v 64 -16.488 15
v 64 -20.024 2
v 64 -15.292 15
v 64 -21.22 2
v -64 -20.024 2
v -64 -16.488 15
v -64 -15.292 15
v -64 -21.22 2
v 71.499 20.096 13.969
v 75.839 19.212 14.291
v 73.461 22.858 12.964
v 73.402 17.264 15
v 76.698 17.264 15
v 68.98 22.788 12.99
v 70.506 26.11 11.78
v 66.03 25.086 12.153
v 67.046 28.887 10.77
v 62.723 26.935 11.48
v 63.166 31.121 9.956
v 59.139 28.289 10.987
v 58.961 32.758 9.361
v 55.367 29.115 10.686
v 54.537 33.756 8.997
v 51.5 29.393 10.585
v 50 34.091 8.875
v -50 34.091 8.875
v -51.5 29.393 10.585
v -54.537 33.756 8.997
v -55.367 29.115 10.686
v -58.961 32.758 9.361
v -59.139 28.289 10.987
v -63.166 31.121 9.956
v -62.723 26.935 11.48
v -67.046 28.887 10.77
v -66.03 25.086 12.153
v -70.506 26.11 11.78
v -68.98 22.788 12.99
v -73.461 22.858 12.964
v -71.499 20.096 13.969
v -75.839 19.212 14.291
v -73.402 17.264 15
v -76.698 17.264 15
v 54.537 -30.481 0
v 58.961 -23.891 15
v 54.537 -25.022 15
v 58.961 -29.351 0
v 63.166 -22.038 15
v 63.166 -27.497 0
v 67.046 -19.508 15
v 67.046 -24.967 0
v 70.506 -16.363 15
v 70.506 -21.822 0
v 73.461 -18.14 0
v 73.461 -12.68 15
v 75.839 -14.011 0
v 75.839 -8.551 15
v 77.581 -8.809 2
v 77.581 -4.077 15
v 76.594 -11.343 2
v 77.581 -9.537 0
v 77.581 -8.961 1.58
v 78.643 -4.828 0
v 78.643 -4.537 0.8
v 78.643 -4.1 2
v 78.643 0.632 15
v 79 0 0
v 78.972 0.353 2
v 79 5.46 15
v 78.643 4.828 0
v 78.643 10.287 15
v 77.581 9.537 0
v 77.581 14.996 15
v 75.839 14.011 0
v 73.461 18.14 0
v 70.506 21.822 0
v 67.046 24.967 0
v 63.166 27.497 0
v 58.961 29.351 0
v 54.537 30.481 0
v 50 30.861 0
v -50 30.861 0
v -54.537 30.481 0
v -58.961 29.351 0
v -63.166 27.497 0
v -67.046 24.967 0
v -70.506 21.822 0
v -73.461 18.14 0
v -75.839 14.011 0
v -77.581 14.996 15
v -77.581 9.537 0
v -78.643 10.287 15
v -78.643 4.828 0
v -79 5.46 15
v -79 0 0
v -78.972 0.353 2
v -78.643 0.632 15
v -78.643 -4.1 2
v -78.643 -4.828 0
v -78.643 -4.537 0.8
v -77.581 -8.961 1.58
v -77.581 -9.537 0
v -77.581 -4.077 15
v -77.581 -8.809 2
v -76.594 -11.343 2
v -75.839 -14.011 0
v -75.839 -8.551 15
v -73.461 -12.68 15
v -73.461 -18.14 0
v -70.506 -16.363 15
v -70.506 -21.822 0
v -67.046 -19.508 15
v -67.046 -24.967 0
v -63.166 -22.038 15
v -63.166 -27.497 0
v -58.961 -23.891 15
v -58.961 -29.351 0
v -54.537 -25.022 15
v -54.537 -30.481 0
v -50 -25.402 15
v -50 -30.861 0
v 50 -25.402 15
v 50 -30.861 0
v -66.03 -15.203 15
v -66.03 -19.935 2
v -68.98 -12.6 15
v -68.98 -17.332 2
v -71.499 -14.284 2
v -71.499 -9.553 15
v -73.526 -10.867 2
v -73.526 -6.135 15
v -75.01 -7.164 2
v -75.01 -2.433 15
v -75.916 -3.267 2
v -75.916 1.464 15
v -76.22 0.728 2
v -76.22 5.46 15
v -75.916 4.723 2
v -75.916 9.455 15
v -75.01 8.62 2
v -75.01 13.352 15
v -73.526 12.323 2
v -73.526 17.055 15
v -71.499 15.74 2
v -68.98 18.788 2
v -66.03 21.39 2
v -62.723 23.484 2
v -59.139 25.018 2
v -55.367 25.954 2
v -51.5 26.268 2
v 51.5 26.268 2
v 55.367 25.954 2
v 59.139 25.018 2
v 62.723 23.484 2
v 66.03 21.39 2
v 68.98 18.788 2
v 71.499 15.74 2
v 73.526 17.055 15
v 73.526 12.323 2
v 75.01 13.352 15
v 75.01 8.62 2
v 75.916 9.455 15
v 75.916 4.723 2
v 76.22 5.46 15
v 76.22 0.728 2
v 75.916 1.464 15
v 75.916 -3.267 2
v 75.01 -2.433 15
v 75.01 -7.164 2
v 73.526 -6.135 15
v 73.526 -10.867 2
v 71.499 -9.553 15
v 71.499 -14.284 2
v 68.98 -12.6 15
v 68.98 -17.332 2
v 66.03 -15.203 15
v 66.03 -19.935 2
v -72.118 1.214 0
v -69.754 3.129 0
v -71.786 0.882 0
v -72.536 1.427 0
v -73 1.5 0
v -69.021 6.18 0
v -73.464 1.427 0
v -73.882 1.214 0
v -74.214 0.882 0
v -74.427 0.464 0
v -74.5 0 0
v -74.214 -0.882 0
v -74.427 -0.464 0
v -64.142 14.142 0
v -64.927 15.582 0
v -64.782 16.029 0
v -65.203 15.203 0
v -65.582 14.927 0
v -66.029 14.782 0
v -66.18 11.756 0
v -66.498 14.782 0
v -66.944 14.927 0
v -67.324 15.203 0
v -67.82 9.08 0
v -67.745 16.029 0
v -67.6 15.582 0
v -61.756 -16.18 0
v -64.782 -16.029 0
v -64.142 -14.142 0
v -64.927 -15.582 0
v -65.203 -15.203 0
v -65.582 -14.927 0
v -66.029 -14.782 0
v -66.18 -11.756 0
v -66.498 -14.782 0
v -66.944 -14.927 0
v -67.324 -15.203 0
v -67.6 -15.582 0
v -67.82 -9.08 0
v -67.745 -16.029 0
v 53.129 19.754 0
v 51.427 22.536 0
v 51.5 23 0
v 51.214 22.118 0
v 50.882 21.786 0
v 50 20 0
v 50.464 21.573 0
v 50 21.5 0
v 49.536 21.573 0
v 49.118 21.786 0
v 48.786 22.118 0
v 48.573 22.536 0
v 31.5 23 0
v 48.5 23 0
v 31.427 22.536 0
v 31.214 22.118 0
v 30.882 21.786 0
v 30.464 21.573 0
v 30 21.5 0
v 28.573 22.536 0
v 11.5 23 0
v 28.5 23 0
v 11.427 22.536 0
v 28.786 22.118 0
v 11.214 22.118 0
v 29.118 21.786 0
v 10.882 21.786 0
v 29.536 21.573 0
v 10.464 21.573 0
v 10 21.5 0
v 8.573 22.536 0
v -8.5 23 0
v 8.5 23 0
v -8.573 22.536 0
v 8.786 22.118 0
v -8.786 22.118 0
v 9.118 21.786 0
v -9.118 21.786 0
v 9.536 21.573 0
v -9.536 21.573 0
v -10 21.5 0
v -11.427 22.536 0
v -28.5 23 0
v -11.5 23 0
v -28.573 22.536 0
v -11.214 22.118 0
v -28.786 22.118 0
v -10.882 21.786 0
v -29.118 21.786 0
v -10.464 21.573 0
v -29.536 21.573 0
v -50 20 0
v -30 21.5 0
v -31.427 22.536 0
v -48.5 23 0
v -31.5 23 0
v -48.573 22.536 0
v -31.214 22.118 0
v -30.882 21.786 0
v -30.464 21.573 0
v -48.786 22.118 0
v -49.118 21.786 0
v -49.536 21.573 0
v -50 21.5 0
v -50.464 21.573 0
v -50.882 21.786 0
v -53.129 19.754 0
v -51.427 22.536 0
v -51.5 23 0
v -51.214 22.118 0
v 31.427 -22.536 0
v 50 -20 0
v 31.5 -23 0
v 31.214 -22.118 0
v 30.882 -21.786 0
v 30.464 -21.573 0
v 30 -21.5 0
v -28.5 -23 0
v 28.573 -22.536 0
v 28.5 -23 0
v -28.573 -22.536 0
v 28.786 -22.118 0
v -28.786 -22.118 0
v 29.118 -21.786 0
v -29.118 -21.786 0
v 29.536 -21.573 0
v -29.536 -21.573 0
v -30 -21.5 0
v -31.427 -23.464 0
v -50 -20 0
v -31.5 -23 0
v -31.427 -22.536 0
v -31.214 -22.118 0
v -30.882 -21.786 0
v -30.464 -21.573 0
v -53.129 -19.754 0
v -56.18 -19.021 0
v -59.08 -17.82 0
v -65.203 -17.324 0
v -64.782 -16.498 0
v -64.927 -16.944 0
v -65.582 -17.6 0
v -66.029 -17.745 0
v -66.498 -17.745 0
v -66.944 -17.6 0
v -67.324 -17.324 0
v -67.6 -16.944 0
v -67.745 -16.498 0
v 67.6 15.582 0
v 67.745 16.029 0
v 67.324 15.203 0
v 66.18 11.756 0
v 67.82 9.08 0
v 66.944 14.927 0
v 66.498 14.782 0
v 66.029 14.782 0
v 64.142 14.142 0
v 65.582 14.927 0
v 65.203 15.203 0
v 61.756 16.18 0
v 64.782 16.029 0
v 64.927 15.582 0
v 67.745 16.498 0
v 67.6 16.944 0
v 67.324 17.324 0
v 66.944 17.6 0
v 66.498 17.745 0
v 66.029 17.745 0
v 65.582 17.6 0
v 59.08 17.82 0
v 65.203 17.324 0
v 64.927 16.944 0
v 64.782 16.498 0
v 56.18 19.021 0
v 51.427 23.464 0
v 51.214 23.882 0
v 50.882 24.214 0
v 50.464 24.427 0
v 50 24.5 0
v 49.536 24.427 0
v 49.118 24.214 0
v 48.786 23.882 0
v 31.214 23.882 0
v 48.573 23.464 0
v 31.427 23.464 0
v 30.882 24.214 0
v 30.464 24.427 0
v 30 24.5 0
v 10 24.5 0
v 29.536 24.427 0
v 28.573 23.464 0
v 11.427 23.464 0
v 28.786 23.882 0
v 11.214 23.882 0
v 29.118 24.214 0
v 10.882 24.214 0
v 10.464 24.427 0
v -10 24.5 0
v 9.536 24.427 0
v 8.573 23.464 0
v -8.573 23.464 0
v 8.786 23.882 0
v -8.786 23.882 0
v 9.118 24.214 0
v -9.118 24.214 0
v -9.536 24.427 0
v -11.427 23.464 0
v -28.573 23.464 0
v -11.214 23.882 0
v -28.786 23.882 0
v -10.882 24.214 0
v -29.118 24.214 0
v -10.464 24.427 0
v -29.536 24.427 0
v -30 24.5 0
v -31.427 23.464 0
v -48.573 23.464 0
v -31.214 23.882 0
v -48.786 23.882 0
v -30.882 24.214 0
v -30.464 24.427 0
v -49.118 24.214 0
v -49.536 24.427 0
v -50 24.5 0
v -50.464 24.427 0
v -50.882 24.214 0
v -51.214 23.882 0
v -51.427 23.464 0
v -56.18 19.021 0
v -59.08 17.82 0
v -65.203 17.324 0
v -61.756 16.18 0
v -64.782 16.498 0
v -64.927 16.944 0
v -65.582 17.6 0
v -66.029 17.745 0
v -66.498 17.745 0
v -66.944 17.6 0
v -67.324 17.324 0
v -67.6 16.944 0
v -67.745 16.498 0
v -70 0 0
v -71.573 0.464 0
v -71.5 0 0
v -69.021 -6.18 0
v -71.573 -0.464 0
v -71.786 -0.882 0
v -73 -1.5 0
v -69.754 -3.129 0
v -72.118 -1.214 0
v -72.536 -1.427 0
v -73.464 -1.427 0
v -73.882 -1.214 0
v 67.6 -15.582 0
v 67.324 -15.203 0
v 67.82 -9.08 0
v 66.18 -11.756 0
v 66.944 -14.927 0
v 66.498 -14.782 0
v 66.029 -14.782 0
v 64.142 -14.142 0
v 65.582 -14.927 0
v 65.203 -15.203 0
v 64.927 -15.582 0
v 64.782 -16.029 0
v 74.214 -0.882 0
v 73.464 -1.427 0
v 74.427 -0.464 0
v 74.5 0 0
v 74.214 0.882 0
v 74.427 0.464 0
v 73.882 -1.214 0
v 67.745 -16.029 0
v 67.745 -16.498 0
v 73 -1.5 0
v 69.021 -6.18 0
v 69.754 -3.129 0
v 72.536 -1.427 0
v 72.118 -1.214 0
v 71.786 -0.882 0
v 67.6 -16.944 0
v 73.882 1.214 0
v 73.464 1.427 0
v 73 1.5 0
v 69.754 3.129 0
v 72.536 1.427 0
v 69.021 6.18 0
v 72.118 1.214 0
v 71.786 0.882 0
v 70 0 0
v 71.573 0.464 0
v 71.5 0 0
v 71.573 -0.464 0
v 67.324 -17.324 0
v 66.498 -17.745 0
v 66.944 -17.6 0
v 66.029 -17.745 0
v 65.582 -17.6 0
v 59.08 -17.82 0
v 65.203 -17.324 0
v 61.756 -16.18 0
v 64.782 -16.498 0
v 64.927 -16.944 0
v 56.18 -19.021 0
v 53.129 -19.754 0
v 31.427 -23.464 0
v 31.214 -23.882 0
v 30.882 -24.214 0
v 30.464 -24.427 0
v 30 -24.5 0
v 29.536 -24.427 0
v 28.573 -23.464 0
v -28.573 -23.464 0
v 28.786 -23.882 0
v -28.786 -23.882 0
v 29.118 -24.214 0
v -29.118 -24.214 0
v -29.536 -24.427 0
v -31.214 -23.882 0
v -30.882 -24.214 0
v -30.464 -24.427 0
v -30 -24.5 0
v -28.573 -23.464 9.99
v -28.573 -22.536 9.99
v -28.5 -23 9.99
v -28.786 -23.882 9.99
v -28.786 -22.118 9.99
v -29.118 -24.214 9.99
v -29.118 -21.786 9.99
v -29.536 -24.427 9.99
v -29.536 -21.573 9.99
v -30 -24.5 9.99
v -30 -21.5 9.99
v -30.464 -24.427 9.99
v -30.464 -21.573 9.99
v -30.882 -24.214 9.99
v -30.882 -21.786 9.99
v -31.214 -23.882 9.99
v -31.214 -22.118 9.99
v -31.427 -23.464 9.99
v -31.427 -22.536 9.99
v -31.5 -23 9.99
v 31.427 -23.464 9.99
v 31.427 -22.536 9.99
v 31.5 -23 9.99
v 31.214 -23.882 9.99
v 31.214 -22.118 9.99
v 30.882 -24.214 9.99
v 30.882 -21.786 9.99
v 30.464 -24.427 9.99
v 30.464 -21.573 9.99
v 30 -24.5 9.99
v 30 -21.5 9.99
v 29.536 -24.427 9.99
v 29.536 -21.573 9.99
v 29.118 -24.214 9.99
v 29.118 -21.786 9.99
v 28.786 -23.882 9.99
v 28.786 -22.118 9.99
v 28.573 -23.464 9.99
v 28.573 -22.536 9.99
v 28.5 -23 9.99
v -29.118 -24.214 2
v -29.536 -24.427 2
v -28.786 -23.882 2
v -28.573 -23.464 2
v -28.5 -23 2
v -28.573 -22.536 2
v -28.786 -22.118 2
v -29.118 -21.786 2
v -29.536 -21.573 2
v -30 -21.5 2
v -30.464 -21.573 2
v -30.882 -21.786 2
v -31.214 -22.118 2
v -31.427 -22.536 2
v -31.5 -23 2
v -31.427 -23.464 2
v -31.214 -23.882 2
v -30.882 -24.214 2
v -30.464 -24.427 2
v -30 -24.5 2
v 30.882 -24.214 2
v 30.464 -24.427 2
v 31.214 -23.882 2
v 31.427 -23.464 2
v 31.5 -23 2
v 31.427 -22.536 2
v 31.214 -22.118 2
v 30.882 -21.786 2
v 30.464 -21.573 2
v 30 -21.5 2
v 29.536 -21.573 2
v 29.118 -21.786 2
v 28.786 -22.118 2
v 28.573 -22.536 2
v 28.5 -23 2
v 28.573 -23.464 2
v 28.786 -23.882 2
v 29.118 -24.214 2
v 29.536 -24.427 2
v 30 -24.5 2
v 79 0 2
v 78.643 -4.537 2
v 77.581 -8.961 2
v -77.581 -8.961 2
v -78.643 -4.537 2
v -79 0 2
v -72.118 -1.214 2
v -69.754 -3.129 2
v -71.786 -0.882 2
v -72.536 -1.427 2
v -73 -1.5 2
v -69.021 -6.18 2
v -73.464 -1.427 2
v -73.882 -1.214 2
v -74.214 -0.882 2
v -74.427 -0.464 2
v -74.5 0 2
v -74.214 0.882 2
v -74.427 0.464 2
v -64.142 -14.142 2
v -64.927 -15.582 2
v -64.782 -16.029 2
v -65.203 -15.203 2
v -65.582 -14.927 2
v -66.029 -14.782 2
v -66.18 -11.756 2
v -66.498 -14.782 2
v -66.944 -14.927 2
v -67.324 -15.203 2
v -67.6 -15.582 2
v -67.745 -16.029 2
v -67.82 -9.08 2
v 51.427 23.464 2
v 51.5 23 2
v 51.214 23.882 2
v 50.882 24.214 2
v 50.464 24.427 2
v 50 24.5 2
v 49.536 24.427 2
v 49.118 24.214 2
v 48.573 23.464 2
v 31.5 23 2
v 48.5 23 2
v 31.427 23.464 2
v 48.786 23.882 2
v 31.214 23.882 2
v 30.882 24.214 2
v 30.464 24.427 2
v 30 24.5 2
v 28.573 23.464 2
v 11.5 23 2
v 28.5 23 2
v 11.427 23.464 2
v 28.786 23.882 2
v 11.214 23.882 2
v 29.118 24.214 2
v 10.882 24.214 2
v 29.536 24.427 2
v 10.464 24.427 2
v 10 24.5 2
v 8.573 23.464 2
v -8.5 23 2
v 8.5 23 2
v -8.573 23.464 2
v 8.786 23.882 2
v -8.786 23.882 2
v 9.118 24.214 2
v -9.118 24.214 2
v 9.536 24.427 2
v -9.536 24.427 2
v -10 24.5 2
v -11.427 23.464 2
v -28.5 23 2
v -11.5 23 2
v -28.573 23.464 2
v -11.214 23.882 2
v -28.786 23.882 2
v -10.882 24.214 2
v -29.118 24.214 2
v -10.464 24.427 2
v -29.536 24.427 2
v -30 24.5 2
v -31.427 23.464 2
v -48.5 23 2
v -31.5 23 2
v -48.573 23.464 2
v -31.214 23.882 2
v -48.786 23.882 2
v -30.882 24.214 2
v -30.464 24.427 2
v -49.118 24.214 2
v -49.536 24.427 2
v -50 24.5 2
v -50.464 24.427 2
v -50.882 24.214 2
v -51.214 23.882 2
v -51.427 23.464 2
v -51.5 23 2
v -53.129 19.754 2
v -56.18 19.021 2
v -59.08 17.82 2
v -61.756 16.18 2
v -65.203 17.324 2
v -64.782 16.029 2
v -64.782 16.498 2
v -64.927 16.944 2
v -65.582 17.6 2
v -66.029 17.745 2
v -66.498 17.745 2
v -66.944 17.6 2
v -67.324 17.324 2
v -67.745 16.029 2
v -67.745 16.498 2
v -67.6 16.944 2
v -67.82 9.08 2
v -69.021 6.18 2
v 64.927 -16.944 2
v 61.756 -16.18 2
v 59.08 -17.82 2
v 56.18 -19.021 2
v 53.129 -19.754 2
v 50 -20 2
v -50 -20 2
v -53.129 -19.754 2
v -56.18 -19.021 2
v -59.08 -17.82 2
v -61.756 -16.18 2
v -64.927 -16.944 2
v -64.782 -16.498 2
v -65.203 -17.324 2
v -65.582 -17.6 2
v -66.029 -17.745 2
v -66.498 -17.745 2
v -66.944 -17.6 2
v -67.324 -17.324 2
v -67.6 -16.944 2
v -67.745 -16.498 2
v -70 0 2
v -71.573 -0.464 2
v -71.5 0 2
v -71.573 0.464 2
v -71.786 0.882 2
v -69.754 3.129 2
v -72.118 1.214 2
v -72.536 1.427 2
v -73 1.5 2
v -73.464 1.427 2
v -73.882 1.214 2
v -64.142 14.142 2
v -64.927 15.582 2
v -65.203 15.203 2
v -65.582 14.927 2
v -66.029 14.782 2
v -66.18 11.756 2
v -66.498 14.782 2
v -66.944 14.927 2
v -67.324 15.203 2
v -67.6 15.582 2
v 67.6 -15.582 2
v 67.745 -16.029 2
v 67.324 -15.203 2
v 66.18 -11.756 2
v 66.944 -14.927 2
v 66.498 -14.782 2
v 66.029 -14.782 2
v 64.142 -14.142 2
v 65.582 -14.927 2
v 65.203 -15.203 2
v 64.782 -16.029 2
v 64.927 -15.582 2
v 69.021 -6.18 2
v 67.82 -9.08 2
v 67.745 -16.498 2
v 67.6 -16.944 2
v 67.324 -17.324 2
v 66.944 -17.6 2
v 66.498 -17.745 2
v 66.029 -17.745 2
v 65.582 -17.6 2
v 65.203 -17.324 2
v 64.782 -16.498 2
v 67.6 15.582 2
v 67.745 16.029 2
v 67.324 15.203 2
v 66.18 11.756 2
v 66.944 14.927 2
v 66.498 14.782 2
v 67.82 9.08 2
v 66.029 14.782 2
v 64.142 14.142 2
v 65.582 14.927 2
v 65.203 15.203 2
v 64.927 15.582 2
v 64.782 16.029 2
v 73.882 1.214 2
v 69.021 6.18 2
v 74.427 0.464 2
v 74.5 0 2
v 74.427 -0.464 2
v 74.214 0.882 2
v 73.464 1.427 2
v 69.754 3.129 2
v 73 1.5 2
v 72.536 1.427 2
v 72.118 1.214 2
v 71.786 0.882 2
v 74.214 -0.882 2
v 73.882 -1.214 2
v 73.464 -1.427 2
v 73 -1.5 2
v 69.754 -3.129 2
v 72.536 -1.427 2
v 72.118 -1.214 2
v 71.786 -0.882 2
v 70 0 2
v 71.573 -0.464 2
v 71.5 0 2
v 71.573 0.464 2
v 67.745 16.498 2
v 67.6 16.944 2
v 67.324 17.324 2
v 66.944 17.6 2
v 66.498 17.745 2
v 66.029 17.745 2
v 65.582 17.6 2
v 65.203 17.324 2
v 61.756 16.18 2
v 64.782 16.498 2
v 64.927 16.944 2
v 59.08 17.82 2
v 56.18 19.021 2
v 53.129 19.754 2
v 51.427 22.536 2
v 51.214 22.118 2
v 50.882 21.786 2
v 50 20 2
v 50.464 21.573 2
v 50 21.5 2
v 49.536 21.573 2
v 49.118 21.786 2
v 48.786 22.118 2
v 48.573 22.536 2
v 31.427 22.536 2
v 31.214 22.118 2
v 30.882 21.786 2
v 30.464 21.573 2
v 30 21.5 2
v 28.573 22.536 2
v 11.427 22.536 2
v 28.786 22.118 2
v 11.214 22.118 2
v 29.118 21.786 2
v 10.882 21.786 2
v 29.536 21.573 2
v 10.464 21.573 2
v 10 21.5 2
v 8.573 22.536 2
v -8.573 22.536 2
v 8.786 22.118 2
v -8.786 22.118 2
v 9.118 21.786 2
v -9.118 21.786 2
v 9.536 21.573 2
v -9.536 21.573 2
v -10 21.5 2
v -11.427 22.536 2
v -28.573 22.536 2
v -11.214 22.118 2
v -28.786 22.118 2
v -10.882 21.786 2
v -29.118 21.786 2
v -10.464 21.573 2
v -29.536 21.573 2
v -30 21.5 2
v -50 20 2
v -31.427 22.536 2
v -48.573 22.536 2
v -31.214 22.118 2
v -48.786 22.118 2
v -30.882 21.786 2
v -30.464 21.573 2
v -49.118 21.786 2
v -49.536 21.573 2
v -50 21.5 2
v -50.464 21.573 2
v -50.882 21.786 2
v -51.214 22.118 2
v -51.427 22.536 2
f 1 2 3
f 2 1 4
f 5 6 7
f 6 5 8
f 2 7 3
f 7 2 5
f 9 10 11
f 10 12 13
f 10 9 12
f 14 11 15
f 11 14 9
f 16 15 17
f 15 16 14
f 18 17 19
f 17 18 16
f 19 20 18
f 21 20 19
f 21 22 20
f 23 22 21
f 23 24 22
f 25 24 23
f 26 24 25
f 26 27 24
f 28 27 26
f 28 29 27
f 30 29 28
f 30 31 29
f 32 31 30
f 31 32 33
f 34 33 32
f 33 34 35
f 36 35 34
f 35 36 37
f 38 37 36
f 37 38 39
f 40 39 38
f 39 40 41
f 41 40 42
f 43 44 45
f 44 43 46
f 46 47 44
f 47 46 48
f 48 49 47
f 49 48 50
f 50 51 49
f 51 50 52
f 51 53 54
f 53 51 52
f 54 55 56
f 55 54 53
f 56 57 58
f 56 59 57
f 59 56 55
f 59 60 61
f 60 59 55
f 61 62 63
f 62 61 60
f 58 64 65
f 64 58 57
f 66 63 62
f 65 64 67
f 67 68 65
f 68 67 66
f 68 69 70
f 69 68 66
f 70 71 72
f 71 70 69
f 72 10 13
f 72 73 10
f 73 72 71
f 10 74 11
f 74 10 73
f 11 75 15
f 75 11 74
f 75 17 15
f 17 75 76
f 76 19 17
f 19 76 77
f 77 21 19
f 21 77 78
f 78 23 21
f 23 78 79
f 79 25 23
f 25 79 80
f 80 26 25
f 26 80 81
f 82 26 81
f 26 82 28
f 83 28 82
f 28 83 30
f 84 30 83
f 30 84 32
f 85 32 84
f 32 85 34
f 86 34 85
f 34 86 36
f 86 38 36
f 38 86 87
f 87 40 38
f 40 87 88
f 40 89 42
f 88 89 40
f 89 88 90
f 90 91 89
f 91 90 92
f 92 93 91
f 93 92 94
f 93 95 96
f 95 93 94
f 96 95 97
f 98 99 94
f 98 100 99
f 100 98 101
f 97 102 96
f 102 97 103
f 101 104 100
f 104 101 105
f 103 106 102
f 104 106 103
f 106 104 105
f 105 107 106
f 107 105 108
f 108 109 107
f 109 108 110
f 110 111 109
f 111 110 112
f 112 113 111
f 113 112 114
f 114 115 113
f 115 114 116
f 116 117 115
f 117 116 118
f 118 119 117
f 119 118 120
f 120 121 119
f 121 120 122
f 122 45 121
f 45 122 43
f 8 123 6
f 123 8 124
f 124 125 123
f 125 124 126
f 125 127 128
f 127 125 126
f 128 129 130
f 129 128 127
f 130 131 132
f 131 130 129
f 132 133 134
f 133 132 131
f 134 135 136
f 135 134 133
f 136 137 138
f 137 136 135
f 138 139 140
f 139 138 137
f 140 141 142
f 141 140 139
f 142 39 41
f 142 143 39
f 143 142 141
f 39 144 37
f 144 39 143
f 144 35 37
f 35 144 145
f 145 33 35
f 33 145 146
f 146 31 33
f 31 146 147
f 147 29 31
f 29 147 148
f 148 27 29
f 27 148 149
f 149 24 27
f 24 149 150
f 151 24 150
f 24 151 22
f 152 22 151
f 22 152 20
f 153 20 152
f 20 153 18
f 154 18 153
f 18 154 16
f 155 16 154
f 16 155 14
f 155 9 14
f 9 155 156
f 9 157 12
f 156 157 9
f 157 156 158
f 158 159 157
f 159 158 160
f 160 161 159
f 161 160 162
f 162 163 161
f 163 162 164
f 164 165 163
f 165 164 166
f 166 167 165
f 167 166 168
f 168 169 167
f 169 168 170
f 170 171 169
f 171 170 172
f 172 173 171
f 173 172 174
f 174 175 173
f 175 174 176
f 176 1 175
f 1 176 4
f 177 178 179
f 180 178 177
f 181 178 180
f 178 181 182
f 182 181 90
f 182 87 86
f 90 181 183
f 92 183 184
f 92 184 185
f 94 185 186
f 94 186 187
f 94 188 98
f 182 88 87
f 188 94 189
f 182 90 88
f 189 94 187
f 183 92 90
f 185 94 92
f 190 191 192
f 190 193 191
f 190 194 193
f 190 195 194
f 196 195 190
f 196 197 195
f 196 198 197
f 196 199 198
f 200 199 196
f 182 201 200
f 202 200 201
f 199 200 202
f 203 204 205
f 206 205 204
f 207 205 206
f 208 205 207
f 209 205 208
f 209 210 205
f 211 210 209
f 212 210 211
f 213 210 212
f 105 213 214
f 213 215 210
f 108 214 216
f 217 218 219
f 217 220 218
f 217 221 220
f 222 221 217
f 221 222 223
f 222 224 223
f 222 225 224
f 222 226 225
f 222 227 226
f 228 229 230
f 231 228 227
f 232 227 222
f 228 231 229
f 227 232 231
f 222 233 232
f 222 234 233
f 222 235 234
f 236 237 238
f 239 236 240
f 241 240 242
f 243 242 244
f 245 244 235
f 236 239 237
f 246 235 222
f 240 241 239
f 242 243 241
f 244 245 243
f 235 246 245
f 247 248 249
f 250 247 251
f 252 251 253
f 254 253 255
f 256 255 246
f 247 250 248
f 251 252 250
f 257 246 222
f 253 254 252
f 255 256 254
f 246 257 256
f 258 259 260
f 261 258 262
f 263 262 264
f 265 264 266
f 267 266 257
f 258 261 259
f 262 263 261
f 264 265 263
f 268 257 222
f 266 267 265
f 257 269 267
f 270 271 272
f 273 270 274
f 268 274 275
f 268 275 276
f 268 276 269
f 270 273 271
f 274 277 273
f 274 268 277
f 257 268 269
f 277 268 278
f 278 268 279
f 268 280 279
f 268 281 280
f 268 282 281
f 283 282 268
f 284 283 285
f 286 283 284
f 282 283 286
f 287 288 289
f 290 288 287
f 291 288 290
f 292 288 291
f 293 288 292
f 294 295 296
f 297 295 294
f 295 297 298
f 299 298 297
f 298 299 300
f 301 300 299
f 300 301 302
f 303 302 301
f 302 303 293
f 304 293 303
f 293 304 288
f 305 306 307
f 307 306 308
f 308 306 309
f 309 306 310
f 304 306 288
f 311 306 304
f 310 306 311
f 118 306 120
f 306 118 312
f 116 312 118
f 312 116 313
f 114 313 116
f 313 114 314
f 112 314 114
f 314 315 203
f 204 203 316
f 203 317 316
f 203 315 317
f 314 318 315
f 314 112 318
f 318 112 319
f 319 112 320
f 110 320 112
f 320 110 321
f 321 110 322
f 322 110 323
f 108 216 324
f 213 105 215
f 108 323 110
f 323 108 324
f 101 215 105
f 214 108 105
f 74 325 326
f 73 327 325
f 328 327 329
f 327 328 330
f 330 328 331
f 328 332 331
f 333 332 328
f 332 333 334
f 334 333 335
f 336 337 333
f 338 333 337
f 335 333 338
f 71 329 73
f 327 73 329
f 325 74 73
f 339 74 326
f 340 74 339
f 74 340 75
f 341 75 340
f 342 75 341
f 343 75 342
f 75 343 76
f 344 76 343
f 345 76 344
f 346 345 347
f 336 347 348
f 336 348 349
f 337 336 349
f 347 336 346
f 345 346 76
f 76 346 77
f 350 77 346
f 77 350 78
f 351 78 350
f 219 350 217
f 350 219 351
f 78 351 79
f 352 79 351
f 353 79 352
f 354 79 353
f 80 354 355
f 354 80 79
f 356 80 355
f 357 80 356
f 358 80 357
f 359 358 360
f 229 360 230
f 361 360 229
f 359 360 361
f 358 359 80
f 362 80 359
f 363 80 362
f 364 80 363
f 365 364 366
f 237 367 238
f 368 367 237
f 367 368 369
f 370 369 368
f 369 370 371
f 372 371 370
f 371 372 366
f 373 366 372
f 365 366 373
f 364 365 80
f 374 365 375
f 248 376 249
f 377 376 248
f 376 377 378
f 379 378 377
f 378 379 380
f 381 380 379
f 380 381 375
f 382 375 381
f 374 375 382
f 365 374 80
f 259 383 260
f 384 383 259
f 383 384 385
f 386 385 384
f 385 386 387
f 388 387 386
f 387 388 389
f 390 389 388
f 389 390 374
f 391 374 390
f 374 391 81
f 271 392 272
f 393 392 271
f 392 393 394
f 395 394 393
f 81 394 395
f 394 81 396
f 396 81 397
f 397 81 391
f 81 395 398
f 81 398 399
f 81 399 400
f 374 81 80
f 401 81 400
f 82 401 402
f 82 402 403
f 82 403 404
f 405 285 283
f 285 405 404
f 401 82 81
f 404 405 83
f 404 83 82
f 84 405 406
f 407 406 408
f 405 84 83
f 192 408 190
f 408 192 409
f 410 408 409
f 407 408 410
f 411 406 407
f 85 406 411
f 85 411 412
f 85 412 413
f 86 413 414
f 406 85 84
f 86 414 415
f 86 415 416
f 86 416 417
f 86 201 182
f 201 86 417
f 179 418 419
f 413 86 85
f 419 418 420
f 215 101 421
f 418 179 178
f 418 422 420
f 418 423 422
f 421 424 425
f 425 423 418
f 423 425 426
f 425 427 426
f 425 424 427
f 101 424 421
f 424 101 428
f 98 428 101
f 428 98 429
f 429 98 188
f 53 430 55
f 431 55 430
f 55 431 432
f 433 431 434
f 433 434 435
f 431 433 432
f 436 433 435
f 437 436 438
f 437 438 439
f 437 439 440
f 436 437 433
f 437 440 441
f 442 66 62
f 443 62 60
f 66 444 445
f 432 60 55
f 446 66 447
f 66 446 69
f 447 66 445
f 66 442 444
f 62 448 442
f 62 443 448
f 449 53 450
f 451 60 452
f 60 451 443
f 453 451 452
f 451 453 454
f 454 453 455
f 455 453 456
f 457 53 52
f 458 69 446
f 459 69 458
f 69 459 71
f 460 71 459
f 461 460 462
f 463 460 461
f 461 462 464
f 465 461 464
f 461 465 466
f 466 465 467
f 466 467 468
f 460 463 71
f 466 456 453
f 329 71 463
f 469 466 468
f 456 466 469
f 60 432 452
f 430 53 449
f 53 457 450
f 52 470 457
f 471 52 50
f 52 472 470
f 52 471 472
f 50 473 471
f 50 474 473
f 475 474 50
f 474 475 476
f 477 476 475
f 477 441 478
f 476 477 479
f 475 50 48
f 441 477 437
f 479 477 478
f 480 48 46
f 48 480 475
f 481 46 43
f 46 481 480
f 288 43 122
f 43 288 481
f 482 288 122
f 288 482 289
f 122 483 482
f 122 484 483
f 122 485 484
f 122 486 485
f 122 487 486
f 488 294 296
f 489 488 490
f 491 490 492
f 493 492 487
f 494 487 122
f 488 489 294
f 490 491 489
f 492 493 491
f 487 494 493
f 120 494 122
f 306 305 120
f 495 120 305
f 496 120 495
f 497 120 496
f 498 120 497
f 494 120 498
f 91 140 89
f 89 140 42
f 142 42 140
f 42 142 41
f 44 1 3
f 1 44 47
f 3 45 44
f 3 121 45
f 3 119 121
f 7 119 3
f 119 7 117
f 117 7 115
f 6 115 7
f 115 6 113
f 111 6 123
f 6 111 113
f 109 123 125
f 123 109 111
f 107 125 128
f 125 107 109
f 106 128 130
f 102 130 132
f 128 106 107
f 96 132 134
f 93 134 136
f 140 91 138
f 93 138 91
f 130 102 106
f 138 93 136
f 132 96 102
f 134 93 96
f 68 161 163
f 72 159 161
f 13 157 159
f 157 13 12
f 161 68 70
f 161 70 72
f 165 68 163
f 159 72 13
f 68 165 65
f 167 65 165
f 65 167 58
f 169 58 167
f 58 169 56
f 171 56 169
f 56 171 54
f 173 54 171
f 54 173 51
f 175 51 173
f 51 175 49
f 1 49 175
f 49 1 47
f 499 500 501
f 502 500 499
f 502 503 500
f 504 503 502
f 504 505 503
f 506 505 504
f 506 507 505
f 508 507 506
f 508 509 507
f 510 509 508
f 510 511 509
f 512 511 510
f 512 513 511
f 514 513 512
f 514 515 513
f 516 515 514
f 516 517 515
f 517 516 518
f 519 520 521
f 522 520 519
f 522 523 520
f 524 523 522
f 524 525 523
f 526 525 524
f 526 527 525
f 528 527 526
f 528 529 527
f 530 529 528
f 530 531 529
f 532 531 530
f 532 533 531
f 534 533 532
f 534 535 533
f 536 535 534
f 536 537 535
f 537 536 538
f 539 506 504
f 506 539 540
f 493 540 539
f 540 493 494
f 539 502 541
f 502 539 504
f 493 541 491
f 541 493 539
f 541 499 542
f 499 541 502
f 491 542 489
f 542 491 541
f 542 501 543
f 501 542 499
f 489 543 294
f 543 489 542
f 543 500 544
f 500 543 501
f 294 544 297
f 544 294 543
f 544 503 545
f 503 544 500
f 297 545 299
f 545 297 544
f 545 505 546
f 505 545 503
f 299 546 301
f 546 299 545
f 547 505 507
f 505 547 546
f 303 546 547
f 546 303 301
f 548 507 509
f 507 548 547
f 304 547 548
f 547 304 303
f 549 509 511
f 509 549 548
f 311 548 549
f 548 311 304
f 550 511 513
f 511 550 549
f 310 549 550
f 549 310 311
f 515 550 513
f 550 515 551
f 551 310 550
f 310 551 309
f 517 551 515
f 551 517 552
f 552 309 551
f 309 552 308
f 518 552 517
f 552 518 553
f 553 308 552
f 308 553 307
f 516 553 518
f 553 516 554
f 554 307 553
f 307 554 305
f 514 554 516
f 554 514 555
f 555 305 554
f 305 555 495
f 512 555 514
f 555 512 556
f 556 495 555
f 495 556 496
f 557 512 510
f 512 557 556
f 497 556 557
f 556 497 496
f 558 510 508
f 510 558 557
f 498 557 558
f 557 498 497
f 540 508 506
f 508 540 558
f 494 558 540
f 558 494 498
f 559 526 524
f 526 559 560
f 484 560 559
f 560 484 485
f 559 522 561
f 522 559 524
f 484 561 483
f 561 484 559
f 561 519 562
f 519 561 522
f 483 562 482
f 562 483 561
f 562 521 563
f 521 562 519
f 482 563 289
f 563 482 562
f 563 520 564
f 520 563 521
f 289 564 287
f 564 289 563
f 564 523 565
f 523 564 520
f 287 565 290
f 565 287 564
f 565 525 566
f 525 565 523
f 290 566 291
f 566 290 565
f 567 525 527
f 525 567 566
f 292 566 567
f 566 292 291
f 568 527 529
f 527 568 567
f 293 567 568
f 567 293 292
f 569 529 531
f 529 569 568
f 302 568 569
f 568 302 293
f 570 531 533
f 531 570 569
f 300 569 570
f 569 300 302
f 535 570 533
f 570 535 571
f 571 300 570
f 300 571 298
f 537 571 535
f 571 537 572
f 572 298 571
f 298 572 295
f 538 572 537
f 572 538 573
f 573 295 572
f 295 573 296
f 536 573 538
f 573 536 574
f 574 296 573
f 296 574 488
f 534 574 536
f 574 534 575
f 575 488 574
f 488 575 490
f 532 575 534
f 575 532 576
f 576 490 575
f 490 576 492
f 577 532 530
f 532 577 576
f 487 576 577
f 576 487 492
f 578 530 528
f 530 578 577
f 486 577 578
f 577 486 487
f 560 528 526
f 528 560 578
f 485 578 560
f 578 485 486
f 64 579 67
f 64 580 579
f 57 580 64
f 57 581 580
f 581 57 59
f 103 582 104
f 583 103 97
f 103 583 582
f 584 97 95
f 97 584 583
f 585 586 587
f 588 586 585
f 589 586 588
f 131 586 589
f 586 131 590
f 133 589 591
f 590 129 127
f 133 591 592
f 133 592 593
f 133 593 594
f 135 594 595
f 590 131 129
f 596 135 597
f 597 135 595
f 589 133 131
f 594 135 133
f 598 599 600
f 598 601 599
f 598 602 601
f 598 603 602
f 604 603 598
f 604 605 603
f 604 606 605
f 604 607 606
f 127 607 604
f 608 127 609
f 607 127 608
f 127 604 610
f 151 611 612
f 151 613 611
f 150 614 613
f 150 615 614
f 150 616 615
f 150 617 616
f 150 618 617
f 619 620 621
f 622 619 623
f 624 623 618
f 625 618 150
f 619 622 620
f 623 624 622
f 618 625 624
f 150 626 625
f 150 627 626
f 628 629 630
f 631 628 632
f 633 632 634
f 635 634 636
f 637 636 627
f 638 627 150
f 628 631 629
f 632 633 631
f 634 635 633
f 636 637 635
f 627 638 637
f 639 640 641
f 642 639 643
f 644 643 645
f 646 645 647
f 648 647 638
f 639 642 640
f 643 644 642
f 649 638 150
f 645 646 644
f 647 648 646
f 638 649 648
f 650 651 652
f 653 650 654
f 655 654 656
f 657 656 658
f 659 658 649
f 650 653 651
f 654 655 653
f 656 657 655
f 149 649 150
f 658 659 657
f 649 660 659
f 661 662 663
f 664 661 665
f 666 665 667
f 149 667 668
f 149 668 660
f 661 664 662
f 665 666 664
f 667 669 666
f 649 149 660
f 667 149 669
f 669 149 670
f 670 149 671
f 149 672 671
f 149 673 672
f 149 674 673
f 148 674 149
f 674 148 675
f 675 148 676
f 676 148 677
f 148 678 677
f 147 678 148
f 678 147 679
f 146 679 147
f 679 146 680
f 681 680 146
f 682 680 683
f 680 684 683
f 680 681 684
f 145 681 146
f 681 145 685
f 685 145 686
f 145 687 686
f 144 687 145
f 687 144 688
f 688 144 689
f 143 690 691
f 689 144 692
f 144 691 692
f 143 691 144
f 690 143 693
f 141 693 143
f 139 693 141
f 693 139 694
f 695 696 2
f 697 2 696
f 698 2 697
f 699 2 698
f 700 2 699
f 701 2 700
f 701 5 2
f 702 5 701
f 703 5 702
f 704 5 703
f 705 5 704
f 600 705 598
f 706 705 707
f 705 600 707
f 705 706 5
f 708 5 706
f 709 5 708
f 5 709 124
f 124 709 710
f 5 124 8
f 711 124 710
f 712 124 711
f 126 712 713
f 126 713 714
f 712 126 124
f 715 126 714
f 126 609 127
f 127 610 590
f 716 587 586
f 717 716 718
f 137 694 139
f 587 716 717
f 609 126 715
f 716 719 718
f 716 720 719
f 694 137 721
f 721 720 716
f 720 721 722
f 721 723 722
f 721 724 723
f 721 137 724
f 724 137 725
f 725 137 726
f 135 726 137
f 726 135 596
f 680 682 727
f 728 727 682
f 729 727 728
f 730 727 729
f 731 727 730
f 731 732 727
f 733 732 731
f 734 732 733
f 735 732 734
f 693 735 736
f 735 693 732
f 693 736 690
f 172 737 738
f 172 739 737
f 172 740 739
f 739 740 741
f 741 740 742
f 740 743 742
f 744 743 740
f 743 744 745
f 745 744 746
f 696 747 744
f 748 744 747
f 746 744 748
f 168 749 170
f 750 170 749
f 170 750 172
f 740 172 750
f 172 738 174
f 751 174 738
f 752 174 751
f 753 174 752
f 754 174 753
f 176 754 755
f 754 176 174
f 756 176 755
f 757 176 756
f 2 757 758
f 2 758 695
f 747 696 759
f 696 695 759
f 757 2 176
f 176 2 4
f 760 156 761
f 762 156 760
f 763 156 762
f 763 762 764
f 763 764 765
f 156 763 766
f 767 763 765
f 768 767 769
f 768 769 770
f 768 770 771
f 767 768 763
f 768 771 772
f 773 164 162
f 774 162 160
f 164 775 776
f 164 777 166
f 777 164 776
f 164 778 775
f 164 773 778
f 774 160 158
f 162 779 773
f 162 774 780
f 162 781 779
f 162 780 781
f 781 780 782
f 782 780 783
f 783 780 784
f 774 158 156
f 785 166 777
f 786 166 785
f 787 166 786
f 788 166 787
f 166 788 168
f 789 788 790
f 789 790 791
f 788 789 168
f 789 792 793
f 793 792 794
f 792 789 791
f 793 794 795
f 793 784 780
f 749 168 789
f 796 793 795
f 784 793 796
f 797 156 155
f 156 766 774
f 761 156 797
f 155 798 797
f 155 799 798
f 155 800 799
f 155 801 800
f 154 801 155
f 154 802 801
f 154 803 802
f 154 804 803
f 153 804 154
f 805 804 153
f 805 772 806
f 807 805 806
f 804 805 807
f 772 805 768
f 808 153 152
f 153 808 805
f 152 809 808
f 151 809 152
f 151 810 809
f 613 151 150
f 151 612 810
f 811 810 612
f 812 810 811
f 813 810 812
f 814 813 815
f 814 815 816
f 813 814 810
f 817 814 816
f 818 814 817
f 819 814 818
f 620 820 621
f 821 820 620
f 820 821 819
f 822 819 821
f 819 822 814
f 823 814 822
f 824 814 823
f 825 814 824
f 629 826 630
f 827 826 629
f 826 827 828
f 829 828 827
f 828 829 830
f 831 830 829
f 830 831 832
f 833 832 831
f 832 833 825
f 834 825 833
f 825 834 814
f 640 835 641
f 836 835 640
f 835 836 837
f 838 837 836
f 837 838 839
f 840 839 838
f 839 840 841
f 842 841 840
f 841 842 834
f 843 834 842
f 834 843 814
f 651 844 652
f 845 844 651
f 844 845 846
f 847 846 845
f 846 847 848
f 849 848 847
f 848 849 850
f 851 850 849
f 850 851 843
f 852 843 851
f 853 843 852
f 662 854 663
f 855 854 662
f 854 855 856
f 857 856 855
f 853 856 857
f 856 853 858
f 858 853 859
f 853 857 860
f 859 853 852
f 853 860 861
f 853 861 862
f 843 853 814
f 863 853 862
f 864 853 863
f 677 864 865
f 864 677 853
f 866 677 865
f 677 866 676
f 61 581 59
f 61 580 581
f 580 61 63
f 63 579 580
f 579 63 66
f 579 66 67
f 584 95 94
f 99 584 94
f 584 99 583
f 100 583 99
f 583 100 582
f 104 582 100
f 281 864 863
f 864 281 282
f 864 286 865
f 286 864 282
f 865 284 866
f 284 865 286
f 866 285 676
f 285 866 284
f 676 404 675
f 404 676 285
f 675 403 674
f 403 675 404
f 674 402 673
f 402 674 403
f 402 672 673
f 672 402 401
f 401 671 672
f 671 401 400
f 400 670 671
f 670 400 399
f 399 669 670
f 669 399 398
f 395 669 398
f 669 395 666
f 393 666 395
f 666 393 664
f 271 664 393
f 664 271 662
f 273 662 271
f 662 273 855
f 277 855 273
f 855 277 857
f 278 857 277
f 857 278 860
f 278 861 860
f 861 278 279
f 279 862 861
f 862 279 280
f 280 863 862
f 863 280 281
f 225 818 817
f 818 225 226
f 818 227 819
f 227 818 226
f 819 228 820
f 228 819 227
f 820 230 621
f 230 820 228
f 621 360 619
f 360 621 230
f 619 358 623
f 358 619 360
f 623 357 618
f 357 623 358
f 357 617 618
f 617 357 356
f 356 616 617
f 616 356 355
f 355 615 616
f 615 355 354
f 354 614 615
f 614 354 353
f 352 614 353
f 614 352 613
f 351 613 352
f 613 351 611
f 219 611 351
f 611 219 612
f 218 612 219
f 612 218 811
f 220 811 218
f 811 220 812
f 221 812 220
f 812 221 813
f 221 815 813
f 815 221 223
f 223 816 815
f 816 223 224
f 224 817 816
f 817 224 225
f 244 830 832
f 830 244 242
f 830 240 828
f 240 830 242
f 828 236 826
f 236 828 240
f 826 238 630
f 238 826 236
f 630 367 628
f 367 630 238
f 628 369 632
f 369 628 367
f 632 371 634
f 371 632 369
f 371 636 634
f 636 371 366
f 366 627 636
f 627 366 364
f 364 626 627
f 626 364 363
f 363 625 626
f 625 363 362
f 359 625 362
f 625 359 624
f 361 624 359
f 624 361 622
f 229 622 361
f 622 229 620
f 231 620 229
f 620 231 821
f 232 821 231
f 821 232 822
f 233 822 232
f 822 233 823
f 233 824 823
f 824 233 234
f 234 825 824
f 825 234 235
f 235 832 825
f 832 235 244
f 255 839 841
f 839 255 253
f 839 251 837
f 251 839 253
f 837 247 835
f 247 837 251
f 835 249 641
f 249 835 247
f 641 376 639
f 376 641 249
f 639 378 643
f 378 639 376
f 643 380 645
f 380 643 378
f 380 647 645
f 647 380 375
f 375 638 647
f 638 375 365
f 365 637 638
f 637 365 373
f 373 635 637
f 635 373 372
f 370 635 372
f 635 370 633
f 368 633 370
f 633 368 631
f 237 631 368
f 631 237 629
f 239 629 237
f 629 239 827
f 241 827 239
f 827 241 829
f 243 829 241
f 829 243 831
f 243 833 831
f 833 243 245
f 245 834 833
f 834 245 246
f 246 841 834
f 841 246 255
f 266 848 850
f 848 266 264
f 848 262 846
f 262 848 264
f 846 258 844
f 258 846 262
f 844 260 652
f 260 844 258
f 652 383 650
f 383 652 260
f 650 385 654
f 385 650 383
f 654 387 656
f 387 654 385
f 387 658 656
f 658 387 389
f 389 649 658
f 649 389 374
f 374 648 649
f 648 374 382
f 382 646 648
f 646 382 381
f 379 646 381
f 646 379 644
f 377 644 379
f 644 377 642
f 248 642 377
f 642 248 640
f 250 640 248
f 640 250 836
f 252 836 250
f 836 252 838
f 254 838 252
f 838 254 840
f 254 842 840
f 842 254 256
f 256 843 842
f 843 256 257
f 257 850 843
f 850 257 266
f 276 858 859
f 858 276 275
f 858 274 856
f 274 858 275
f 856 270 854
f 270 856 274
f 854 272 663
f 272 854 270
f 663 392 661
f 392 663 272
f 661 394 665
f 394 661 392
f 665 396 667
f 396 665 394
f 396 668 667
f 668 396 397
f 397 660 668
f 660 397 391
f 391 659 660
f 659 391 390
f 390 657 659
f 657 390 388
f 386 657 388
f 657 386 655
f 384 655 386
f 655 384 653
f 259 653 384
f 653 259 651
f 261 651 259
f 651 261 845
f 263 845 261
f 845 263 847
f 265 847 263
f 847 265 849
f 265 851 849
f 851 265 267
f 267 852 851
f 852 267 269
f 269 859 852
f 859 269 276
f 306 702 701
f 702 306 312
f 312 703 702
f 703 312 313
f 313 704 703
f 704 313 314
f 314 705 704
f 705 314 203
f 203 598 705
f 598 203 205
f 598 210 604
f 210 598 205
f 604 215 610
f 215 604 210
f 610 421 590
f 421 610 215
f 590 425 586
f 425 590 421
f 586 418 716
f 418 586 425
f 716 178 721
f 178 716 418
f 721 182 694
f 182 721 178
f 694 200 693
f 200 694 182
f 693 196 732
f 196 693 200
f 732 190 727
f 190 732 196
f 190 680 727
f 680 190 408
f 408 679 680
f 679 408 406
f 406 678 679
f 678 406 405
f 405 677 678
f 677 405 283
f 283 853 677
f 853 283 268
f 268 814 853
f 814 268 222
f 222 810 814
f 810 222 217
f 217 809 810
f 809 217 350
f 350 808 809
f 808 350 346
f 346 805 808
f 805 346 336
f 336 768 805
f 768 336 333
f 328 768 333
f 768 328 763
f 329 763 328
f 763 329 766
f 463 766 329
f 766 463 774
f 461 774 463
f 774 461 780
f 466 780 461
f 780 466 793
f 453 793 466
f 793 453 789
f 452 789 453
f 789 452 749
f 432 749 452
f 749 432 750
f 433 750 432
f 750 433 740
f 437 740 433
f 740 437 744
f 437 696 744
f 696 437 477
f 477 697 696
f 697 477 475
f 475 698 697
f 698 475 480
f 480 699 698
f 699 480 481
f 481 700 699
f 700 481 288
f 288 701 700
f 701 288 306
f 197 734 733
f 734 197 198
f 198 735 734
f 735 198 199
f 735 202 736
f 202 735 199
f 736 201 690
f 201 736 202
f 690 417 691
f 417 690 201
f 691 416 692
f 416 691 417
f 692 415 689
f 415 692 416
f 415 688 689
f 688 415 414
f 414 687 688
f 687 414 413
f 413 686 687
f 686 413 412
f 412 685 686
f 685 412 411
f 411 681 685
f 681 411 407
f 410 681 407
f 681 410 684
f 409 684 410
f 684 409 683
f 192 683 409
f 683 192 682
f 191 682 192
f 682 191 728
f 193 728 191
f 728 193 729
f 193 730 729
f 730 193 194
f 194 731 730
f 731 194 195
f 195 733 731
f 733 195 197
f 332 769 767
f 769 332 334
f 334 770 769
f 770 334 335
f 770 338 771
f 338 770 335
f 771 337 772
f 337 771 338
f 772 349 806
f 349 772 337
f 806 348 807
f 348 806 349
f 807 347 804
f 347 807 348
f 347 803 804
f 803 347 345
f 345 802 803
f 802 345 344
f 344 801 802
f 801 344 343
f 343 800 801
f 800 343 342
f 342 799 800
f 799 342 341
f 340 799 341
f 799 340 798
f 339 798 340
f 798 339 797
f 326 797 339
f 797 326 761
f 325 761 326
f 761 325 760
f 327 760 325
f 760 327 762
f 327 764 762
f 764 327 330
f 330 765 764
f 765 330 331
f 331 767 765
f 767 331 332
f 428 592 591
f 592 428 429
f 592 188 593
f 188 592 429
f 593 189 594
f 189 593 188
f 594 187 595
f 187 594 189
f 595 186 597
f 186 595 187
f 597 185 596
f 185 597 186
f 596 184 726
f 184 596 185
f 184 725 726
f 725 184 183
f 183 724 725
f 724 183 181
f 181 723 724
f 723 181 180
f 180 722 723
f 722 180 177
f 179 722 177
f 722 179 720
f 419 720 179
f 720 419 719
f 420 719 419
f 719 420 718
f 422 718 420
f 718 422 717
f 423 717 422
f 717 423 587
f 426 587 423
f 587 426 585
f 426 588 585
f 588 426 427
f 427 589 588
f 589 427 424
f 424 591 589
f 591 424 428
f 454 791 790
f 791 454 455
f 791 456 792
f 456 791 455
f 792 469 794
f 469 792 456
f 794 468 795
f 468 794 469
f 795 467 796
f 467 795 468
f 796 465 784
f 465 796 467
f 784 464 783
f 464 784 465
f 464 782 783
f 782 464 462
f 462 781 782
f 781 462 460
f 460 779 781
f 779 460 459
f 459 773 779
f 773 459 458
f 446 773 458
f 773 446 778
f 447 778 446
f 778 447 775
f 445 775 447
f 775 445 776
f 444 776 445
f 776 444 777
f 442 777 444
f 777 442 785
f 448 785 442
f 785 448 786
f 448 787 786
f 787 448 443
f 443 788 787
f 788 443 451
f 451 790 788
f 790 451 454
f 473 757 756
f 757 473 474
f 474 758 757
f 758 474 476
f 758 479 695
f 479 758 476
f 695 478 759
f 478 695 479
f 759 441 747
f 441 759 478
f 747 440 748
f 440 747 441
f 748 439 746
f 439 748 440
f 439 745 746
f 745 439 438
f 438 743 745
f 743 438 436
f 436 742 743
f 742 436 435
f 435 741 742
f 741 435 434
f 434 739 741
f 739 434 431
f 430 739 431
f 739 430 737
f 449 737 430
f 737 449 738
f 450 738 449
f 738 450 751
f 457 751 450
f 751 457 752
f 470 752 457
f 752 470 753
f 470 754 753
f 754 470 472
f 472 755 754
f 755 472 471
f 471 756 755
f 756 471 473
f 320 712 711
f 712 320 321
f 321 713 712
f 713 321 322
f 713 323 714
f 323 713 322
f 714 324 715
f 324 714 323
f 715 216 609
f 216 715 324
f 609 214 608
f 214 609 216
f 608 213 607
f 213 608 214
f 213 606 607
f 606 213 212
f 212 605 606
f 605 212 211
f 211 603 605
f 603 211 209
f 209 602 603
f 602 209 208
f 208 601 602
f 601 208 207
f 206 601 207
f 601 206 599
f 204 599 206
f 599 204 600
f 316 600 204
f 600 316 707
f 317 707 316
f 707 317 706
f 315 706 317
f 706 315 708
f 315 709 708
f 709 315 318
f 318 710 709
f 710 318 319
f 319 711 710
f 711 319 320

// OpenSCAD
ld=42;
bd=58;
xoffs=[0];
%mirror([0,0,1])
  bottom();
top();
module bottom() {
  difference() {
    union() {
      connector(1);
      for(x=xoffs)
        translate([x,0]) intersection() {
          rotate([30,0]) translate([0,0,-10]) cylinder(d=40,h=50,$fn=80);
          translate([-20,-40]) cube([40,80,60]);
        }
    }
      for(x=xoffs)
        translate([x,0]) rotate([30,0]) translate([0,0,-20]) cylinder(d=36,h=70,$fn=70);
    }
}
module top() {
  connector();
  skirt();
}
module connector(mid=0) {
linear_extrude(2,convexity=2) difference() {
  hull() {
    translate([-50,0]) circle(d=bd,$fn=40);
    translate([50,0]) circle(d=bd,$fn=40);
  }
  if(!mid)
  hull() {
    translate([-50,0]) circle(d=ld-2,$fn=40);
    translate([50,0]) circle(d=ld-2,$fn=40);
  }
  for(m=[0,1]) mirror([m,0])
  translate([-50,0]) for(r=[90:45:270]) rotate([0,0,r]) translate([ld/2+2,0]) circle(d=3,h=3,$fn=20);
  for(x=[-30:20:30],y=[-ld/2-2,ld/2+2]) if(y>0||abs(x)>11)
    translate([x,y]) circle(d=3,$fn=20);
}
}
module skirt() {
  difference() {
    intersection() {
      translate([-100,-40]) cube([200,80,50]);
      union(){
        rotate([-20,0]) {
        translate([-64,-25,-10]) cube([128,5.5,20]);
        translate([0,0,-20]) linear_extrude(40,convexity=2) difference() {
          hull() {
            translate([-50,0]) circle(d=bd,$fn=40);
            translate([50,0]) circle(d=bd,$fn=40);
          }
          scale([1.03,1])
          hull() {
            translate([-50,0]) circle(d=bd-10,$fn=40);
            translate([50,0]) circle(d=bd-10,$fn=40);
          }
        }
        }
      }
    }
    translate([-80,-50,15]) cube([160,100,50]);
    translate([0,0,-.01]) linear_extrude(10) {
      *for(m=[0,1]) mirror([m,0])
      translate([-50,0]) for(r=[90:45:270]) rotate([0,0,r]) translate([ld/2+2,0]) circle(d=3,h=3,$fn=20);
      for(x=[-30:20:30],y=[-ld/2-2,ld/2+2]) if(y>0||abs(x)>11)
        translate([x,y]) circle(d=3,$fn=20);
      }
    }
}
